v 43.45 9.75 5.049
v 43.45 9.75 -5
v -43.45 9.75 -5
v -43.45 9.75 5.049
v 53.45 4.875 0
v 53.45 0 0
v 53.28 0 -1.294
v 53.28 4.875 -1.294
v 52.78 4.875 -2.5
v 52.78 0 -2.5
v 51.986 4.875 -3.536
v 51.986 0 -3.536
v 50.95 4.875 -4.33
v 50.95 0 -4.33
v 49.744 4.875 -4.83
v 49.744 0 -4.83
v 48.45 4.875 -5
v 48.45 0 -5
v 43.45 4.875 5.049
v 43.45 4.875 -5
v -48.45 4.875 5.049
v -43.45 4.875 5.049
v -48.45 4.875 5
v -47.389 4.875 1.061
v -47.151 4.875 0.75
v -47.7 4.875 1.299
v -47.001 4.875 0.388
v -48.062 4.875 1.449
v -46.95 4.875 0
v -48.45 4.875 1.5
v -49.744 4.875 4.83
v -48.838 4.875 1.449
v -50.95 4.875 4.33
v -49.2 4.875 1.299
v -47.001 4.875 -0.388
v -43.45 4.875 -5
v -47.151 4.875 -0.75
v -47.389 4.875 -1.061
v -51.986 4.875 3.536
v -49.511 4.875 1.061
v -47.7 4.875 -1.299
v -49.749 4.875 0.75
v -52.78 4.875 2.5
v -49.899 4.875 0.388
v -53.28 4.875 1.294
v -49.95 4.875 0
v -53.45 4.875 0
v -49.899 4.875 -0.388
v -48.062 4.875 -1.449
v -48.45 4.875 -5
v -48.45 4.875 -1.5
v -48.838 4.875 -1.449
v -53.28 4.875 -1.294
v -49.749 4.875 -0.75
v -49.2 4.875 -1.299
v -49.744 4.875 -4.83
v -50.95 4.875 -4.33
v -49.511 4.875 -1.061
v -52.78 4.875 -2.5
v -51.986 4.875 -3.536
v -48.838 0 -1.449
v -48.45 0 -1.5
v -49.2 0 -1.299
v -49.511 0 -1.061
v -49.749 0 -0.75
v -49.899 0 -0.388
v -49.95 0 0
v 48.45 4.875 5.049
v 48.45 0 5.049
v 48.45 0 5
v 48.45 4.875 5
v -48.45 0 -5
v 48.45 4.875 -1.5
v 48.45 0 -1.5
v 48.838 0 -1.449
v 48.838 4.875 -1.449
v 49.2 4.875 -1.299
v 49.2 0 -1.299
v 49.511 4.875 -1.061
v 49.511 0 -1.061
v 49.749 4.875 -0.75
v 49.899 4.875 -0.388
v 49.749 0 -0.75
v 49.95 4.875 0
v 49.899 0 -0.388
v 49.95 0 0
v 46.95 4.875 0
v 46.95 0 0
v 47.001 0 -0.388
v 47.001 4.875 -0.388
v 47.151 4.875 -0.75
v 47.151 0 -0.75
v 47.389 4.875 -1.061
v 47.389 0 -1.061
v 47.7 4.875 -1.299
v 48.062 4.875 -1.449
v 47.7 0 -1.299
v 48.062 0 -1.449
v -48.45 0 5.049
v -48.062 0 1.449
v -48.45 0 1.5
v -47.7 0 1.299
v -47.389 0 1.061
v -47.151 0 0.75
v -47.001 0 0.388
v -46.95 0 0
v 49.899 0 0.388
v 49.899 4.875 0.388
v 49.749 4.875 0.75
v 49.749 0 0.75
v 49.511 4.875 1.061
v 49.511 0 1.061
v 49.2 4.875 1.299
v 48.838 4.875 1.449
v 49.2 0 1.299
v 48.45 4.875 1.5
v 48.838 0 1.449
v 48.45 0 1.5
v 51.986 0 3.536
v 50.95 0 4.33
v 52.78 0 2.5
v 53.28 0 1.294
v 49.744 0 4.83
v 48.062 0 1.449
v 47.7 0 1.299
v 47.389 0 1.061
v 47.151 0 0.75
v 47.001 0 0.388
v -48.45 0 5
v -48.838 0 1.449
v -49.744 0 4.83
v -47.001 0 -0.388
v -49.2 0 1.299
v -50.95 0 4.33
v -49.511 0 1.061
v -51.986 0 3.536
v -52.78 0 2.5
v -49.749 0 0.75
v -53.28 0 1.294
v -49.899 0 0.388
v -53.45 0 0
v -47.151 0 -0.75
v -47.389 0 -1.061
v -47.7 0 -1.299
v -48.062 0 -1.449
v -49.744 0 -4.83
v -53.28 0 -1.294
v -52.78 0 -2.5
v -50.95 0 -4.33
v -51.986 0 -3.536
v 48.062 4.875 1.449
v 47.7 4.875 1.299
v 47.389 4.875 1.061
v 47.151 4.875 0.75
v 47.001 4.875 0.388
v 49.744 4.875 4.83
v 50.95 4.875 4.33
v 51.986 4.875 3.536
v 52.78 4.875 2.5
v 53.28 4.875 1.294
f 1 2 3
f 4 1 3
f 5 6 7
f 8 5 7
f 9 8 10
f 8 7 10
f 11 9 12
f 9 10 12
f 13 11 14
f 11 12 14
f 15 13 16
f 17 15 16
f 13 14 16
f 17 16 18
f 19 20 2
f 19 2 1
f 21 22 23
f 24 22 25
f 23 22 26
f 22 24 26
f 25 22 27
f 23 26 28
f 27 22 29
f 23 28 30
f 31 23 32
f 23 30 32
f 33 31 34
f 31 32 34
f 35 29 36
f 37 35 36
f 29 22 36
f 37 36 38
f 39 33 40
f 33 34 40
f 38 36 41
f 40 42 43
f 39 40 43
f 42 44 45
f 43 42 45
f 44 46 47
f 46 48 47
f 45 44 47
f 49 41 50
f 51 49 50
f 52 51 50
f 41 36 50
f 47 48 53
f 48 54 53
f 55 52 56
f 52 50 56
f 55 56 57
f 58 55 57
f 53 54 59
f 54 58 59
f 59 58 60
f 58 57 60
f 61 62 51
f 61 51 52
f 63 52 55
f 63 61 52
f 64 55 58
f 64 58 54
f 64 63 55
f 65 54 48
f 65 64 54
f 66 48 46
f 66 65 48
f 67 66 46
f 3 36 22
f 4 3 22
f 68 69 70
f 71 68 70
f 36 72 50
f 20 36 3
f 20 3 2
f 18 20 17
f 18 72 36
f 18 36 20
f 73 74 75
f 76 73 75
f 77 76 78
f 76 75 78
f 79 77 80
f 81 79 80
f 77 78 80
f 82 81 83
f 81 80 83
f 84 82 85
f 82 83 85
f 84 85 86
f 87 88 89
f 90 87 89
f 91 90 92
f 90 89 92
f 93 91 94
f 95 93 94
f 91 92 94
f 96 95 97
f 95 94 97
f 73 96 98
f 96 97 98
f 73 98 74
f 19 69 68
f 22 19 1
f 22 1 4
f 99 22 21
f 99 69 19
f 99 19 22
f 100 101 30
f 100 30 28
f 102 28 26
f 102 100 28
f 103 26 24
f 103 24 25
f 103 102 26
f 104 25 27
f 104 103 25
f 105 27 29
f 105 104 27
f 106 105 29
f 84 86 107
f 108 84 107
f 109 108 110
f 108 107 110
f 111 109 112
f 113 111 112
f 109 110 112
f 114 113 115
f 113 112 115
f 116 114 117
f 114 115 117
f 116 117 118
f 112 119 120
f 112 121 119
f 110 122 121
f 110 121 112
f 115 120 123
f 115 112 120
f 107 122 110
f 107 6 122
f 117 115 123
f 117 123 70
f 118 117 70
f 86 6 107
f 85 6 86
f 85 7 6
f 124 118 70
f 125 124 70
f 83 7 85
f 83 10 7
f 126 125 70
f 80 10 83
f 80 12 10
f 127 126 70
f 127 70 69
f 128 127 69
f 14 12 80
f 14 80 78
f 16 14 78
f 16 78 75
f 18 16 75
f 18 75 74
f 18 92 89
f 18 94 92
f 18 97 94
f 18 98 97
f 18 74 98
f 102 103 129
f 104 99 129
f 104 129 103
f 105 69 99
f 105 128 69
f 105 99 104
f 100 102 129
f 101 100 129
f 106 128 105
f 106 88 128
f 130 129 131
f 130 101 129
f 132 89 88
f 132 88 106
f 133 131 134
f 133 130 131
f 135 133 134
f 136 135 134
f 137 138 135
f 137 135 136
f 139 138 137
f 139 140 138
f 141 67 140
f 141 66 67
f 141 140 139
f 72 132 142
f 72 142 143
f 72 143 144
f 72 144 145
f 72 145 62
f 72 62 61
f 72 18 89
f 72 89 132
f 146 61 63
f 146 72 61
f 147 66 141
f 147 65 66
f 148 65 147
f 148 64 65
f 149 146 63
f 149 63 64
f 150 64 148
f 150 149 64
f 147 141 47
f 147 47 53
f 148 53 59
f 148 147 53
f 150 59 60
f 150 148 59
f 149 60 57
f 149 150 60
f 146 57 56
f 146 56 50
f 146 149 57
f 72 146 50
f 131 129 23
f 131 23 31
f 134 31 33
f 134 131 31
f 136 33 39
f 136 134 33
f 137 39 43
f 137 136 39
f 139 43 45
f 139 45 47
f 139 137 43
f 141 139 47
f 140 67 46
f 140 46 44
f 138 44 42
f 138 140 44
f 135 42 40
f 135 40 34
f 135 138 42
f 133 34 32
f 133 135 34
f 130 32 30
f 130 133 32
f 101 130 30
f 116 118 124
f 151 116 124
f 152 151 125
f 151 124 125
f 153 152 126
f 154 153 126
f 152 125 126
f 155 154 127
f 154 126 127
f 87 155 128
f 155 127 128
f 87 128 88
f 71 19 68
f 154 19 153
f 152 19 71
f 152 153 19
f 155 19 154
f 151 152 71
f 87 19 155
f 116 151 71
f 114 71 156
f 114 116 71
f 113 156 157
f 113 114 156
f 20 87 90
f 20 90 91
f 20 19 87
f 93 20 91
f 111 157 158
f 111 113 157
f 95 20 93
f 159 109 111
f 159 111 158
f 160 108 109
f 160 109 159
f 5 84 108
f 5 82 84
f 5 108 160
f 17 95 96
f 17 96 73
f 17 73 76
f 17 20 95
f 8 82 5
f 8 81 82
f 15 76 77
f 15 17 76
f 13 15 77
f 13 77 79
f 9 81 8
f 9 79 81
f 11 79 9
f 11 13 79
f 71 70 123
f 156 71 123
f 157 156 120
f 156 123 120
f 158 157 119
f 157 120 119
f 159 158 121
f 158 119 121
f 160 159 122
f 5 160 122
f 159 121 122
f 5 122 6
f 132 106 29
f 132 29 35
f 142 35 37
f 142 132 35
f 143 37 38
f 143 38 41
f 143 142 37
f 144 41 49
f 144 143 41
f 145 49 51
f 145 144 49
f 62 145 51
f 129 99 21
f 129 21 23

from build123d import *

# Parameters (mm, degrees)
BOSS_EXTRUDE1_DEPTH = 9.75
CUT_EXTRUDE3_START  = -4.875
CUT_EXTRUDE3_DEPTH  = 4.875


with BuildPart() as part:
    # Sketch1 → Boss-Extrude1 (new body)
    with BuildSketch(Plane(origin=(0, 0, 0), x_dir=(1, 0, 0), z_dir=(0, 1, 0))):
        with BuildLine():
            Line((0, 5), (0, 0))
            Line((0, 0), (43.45, 0))
            ThreePointArc((43.45, 0), (44.914466094, 3.535533906), (48.45, 5))
            Line((48.45, 5), (0, 5))
        make_face()
        with BuildLine():
            Line((43.45, 0), (0, 0))
            Line((0, 0), (0, -5.049027621))
            Line((0, -5.049027621), (48.45, -5.049027621))
            Line((48.45, -5.049027621), (48.45, -5))
            ThreePointArc((48.45, -5), (44.914466094, -3.535533906), (43.45, 0))
        make_face()
        with BuildLine():
            ThreePointArc((53.45, 0), (51.985533906, 3.535533906), (48.45, 5))
            Line((48.45, 5), (48.45, 1.5))
            ThreePointArc((48.45, 1.5), (49.510660172, 1.060660172), (49.95, 0))
            ThreePointArc((49.95, 0), (49.510660172, -1.060660172), (48.45, -1.5))
            Line((48.45, -1.5), (48.45, -5))
            ThreePointArc((48.45, -5), (51.985533906, -3.535533906), (53.45, 0))
        make_face()
        with BuildLine():
            ThreePointArc((48.45, 5), (44.914466094, 3.535533906), (43.45, 0))
            Line((43.45, 0), (46.95, 0))
            ThreePointArc((46.95, 0), (47.389339828, 1.060660172), (48.45, 1.5))
            Line((48.45, 1.5), (48.45, 5))
        make_face()
        with BuildLine():
            Line((46.95, 0), (43.45, 0))
            ThreePointArc((43.45, 0), (44.914466094, -3.535533906), (48.45, -5))
            Line((48.45, -5), (48.45, -1.5))
            ThreePointArc((48.45, -1.5), (47.389339828, -1.060660172), (46.95, 0))
        make_face()
    boss_extrude1 = extrude(amount=BOSS_EXTRUDE1_DEPTH)

    # Mirror1: Boss-Extrude1 across plane
    add(boss_extrude1.mirror(Plane(origin=(0, 0, 0), x_dir=(0, 0, 1), z_dir=(1, 0, 0))))

    # Sketch2 → Cut-Extrude3 (cut)
    with BuildSketch(Plane(origin=(0, 9.75, 0), x_dir=(1, 0, 0), z_dir=(0, 1, 0)).offset(CUT_EXTRUDE3_START)):
        with BuildLine():
            Line((49.95, 0), (53.45, 0))
            ThreePointArc((53.45, 0), (51.985533906, 3.535533906), (48.45, 5))
            Line((48.45, 5), (43.45, 5))
            Line((43.45, 5), (43.45, 0))
            Line((43.45, 0), (46.95, 0))
            ThreePointArc((46.95, 0), (48.45, 1.5), (49.95, 0))
        make_face()
        with BuildLine():
            ThreePointArc((48.45, -5), (51.985533906, -3.535533906), (53.45, 0))
            Line((53.45, 0), (49.95, 0))
            ThreePointArc((49.95, 0), (48.45, -1.5), (46.95, 0))
            Line((46.95, 0), (43.45, 0))
            Line((43.45, 0), (43.45, -5.049027621))
            Line((43.45, -5.049027621), (48.45, -5.049027621))
            Line((48.45, -5.049027621), (48.45, -5))
        make_face()
    cut_extrude3 = extrude(amount=CUT_EXTRUDE3_DEPTH, mode=Mode.SUBTRACT)

    # Mirror2: Cut-Extrude3 across plane
    add(cut_extrude3.mirror(Plane(origin=(0, 0, 0), x_dir=(0, 0, 1), z_dir=(1, 0, 0))), mode=Mode.SUBTRACT)


solid = part.part
